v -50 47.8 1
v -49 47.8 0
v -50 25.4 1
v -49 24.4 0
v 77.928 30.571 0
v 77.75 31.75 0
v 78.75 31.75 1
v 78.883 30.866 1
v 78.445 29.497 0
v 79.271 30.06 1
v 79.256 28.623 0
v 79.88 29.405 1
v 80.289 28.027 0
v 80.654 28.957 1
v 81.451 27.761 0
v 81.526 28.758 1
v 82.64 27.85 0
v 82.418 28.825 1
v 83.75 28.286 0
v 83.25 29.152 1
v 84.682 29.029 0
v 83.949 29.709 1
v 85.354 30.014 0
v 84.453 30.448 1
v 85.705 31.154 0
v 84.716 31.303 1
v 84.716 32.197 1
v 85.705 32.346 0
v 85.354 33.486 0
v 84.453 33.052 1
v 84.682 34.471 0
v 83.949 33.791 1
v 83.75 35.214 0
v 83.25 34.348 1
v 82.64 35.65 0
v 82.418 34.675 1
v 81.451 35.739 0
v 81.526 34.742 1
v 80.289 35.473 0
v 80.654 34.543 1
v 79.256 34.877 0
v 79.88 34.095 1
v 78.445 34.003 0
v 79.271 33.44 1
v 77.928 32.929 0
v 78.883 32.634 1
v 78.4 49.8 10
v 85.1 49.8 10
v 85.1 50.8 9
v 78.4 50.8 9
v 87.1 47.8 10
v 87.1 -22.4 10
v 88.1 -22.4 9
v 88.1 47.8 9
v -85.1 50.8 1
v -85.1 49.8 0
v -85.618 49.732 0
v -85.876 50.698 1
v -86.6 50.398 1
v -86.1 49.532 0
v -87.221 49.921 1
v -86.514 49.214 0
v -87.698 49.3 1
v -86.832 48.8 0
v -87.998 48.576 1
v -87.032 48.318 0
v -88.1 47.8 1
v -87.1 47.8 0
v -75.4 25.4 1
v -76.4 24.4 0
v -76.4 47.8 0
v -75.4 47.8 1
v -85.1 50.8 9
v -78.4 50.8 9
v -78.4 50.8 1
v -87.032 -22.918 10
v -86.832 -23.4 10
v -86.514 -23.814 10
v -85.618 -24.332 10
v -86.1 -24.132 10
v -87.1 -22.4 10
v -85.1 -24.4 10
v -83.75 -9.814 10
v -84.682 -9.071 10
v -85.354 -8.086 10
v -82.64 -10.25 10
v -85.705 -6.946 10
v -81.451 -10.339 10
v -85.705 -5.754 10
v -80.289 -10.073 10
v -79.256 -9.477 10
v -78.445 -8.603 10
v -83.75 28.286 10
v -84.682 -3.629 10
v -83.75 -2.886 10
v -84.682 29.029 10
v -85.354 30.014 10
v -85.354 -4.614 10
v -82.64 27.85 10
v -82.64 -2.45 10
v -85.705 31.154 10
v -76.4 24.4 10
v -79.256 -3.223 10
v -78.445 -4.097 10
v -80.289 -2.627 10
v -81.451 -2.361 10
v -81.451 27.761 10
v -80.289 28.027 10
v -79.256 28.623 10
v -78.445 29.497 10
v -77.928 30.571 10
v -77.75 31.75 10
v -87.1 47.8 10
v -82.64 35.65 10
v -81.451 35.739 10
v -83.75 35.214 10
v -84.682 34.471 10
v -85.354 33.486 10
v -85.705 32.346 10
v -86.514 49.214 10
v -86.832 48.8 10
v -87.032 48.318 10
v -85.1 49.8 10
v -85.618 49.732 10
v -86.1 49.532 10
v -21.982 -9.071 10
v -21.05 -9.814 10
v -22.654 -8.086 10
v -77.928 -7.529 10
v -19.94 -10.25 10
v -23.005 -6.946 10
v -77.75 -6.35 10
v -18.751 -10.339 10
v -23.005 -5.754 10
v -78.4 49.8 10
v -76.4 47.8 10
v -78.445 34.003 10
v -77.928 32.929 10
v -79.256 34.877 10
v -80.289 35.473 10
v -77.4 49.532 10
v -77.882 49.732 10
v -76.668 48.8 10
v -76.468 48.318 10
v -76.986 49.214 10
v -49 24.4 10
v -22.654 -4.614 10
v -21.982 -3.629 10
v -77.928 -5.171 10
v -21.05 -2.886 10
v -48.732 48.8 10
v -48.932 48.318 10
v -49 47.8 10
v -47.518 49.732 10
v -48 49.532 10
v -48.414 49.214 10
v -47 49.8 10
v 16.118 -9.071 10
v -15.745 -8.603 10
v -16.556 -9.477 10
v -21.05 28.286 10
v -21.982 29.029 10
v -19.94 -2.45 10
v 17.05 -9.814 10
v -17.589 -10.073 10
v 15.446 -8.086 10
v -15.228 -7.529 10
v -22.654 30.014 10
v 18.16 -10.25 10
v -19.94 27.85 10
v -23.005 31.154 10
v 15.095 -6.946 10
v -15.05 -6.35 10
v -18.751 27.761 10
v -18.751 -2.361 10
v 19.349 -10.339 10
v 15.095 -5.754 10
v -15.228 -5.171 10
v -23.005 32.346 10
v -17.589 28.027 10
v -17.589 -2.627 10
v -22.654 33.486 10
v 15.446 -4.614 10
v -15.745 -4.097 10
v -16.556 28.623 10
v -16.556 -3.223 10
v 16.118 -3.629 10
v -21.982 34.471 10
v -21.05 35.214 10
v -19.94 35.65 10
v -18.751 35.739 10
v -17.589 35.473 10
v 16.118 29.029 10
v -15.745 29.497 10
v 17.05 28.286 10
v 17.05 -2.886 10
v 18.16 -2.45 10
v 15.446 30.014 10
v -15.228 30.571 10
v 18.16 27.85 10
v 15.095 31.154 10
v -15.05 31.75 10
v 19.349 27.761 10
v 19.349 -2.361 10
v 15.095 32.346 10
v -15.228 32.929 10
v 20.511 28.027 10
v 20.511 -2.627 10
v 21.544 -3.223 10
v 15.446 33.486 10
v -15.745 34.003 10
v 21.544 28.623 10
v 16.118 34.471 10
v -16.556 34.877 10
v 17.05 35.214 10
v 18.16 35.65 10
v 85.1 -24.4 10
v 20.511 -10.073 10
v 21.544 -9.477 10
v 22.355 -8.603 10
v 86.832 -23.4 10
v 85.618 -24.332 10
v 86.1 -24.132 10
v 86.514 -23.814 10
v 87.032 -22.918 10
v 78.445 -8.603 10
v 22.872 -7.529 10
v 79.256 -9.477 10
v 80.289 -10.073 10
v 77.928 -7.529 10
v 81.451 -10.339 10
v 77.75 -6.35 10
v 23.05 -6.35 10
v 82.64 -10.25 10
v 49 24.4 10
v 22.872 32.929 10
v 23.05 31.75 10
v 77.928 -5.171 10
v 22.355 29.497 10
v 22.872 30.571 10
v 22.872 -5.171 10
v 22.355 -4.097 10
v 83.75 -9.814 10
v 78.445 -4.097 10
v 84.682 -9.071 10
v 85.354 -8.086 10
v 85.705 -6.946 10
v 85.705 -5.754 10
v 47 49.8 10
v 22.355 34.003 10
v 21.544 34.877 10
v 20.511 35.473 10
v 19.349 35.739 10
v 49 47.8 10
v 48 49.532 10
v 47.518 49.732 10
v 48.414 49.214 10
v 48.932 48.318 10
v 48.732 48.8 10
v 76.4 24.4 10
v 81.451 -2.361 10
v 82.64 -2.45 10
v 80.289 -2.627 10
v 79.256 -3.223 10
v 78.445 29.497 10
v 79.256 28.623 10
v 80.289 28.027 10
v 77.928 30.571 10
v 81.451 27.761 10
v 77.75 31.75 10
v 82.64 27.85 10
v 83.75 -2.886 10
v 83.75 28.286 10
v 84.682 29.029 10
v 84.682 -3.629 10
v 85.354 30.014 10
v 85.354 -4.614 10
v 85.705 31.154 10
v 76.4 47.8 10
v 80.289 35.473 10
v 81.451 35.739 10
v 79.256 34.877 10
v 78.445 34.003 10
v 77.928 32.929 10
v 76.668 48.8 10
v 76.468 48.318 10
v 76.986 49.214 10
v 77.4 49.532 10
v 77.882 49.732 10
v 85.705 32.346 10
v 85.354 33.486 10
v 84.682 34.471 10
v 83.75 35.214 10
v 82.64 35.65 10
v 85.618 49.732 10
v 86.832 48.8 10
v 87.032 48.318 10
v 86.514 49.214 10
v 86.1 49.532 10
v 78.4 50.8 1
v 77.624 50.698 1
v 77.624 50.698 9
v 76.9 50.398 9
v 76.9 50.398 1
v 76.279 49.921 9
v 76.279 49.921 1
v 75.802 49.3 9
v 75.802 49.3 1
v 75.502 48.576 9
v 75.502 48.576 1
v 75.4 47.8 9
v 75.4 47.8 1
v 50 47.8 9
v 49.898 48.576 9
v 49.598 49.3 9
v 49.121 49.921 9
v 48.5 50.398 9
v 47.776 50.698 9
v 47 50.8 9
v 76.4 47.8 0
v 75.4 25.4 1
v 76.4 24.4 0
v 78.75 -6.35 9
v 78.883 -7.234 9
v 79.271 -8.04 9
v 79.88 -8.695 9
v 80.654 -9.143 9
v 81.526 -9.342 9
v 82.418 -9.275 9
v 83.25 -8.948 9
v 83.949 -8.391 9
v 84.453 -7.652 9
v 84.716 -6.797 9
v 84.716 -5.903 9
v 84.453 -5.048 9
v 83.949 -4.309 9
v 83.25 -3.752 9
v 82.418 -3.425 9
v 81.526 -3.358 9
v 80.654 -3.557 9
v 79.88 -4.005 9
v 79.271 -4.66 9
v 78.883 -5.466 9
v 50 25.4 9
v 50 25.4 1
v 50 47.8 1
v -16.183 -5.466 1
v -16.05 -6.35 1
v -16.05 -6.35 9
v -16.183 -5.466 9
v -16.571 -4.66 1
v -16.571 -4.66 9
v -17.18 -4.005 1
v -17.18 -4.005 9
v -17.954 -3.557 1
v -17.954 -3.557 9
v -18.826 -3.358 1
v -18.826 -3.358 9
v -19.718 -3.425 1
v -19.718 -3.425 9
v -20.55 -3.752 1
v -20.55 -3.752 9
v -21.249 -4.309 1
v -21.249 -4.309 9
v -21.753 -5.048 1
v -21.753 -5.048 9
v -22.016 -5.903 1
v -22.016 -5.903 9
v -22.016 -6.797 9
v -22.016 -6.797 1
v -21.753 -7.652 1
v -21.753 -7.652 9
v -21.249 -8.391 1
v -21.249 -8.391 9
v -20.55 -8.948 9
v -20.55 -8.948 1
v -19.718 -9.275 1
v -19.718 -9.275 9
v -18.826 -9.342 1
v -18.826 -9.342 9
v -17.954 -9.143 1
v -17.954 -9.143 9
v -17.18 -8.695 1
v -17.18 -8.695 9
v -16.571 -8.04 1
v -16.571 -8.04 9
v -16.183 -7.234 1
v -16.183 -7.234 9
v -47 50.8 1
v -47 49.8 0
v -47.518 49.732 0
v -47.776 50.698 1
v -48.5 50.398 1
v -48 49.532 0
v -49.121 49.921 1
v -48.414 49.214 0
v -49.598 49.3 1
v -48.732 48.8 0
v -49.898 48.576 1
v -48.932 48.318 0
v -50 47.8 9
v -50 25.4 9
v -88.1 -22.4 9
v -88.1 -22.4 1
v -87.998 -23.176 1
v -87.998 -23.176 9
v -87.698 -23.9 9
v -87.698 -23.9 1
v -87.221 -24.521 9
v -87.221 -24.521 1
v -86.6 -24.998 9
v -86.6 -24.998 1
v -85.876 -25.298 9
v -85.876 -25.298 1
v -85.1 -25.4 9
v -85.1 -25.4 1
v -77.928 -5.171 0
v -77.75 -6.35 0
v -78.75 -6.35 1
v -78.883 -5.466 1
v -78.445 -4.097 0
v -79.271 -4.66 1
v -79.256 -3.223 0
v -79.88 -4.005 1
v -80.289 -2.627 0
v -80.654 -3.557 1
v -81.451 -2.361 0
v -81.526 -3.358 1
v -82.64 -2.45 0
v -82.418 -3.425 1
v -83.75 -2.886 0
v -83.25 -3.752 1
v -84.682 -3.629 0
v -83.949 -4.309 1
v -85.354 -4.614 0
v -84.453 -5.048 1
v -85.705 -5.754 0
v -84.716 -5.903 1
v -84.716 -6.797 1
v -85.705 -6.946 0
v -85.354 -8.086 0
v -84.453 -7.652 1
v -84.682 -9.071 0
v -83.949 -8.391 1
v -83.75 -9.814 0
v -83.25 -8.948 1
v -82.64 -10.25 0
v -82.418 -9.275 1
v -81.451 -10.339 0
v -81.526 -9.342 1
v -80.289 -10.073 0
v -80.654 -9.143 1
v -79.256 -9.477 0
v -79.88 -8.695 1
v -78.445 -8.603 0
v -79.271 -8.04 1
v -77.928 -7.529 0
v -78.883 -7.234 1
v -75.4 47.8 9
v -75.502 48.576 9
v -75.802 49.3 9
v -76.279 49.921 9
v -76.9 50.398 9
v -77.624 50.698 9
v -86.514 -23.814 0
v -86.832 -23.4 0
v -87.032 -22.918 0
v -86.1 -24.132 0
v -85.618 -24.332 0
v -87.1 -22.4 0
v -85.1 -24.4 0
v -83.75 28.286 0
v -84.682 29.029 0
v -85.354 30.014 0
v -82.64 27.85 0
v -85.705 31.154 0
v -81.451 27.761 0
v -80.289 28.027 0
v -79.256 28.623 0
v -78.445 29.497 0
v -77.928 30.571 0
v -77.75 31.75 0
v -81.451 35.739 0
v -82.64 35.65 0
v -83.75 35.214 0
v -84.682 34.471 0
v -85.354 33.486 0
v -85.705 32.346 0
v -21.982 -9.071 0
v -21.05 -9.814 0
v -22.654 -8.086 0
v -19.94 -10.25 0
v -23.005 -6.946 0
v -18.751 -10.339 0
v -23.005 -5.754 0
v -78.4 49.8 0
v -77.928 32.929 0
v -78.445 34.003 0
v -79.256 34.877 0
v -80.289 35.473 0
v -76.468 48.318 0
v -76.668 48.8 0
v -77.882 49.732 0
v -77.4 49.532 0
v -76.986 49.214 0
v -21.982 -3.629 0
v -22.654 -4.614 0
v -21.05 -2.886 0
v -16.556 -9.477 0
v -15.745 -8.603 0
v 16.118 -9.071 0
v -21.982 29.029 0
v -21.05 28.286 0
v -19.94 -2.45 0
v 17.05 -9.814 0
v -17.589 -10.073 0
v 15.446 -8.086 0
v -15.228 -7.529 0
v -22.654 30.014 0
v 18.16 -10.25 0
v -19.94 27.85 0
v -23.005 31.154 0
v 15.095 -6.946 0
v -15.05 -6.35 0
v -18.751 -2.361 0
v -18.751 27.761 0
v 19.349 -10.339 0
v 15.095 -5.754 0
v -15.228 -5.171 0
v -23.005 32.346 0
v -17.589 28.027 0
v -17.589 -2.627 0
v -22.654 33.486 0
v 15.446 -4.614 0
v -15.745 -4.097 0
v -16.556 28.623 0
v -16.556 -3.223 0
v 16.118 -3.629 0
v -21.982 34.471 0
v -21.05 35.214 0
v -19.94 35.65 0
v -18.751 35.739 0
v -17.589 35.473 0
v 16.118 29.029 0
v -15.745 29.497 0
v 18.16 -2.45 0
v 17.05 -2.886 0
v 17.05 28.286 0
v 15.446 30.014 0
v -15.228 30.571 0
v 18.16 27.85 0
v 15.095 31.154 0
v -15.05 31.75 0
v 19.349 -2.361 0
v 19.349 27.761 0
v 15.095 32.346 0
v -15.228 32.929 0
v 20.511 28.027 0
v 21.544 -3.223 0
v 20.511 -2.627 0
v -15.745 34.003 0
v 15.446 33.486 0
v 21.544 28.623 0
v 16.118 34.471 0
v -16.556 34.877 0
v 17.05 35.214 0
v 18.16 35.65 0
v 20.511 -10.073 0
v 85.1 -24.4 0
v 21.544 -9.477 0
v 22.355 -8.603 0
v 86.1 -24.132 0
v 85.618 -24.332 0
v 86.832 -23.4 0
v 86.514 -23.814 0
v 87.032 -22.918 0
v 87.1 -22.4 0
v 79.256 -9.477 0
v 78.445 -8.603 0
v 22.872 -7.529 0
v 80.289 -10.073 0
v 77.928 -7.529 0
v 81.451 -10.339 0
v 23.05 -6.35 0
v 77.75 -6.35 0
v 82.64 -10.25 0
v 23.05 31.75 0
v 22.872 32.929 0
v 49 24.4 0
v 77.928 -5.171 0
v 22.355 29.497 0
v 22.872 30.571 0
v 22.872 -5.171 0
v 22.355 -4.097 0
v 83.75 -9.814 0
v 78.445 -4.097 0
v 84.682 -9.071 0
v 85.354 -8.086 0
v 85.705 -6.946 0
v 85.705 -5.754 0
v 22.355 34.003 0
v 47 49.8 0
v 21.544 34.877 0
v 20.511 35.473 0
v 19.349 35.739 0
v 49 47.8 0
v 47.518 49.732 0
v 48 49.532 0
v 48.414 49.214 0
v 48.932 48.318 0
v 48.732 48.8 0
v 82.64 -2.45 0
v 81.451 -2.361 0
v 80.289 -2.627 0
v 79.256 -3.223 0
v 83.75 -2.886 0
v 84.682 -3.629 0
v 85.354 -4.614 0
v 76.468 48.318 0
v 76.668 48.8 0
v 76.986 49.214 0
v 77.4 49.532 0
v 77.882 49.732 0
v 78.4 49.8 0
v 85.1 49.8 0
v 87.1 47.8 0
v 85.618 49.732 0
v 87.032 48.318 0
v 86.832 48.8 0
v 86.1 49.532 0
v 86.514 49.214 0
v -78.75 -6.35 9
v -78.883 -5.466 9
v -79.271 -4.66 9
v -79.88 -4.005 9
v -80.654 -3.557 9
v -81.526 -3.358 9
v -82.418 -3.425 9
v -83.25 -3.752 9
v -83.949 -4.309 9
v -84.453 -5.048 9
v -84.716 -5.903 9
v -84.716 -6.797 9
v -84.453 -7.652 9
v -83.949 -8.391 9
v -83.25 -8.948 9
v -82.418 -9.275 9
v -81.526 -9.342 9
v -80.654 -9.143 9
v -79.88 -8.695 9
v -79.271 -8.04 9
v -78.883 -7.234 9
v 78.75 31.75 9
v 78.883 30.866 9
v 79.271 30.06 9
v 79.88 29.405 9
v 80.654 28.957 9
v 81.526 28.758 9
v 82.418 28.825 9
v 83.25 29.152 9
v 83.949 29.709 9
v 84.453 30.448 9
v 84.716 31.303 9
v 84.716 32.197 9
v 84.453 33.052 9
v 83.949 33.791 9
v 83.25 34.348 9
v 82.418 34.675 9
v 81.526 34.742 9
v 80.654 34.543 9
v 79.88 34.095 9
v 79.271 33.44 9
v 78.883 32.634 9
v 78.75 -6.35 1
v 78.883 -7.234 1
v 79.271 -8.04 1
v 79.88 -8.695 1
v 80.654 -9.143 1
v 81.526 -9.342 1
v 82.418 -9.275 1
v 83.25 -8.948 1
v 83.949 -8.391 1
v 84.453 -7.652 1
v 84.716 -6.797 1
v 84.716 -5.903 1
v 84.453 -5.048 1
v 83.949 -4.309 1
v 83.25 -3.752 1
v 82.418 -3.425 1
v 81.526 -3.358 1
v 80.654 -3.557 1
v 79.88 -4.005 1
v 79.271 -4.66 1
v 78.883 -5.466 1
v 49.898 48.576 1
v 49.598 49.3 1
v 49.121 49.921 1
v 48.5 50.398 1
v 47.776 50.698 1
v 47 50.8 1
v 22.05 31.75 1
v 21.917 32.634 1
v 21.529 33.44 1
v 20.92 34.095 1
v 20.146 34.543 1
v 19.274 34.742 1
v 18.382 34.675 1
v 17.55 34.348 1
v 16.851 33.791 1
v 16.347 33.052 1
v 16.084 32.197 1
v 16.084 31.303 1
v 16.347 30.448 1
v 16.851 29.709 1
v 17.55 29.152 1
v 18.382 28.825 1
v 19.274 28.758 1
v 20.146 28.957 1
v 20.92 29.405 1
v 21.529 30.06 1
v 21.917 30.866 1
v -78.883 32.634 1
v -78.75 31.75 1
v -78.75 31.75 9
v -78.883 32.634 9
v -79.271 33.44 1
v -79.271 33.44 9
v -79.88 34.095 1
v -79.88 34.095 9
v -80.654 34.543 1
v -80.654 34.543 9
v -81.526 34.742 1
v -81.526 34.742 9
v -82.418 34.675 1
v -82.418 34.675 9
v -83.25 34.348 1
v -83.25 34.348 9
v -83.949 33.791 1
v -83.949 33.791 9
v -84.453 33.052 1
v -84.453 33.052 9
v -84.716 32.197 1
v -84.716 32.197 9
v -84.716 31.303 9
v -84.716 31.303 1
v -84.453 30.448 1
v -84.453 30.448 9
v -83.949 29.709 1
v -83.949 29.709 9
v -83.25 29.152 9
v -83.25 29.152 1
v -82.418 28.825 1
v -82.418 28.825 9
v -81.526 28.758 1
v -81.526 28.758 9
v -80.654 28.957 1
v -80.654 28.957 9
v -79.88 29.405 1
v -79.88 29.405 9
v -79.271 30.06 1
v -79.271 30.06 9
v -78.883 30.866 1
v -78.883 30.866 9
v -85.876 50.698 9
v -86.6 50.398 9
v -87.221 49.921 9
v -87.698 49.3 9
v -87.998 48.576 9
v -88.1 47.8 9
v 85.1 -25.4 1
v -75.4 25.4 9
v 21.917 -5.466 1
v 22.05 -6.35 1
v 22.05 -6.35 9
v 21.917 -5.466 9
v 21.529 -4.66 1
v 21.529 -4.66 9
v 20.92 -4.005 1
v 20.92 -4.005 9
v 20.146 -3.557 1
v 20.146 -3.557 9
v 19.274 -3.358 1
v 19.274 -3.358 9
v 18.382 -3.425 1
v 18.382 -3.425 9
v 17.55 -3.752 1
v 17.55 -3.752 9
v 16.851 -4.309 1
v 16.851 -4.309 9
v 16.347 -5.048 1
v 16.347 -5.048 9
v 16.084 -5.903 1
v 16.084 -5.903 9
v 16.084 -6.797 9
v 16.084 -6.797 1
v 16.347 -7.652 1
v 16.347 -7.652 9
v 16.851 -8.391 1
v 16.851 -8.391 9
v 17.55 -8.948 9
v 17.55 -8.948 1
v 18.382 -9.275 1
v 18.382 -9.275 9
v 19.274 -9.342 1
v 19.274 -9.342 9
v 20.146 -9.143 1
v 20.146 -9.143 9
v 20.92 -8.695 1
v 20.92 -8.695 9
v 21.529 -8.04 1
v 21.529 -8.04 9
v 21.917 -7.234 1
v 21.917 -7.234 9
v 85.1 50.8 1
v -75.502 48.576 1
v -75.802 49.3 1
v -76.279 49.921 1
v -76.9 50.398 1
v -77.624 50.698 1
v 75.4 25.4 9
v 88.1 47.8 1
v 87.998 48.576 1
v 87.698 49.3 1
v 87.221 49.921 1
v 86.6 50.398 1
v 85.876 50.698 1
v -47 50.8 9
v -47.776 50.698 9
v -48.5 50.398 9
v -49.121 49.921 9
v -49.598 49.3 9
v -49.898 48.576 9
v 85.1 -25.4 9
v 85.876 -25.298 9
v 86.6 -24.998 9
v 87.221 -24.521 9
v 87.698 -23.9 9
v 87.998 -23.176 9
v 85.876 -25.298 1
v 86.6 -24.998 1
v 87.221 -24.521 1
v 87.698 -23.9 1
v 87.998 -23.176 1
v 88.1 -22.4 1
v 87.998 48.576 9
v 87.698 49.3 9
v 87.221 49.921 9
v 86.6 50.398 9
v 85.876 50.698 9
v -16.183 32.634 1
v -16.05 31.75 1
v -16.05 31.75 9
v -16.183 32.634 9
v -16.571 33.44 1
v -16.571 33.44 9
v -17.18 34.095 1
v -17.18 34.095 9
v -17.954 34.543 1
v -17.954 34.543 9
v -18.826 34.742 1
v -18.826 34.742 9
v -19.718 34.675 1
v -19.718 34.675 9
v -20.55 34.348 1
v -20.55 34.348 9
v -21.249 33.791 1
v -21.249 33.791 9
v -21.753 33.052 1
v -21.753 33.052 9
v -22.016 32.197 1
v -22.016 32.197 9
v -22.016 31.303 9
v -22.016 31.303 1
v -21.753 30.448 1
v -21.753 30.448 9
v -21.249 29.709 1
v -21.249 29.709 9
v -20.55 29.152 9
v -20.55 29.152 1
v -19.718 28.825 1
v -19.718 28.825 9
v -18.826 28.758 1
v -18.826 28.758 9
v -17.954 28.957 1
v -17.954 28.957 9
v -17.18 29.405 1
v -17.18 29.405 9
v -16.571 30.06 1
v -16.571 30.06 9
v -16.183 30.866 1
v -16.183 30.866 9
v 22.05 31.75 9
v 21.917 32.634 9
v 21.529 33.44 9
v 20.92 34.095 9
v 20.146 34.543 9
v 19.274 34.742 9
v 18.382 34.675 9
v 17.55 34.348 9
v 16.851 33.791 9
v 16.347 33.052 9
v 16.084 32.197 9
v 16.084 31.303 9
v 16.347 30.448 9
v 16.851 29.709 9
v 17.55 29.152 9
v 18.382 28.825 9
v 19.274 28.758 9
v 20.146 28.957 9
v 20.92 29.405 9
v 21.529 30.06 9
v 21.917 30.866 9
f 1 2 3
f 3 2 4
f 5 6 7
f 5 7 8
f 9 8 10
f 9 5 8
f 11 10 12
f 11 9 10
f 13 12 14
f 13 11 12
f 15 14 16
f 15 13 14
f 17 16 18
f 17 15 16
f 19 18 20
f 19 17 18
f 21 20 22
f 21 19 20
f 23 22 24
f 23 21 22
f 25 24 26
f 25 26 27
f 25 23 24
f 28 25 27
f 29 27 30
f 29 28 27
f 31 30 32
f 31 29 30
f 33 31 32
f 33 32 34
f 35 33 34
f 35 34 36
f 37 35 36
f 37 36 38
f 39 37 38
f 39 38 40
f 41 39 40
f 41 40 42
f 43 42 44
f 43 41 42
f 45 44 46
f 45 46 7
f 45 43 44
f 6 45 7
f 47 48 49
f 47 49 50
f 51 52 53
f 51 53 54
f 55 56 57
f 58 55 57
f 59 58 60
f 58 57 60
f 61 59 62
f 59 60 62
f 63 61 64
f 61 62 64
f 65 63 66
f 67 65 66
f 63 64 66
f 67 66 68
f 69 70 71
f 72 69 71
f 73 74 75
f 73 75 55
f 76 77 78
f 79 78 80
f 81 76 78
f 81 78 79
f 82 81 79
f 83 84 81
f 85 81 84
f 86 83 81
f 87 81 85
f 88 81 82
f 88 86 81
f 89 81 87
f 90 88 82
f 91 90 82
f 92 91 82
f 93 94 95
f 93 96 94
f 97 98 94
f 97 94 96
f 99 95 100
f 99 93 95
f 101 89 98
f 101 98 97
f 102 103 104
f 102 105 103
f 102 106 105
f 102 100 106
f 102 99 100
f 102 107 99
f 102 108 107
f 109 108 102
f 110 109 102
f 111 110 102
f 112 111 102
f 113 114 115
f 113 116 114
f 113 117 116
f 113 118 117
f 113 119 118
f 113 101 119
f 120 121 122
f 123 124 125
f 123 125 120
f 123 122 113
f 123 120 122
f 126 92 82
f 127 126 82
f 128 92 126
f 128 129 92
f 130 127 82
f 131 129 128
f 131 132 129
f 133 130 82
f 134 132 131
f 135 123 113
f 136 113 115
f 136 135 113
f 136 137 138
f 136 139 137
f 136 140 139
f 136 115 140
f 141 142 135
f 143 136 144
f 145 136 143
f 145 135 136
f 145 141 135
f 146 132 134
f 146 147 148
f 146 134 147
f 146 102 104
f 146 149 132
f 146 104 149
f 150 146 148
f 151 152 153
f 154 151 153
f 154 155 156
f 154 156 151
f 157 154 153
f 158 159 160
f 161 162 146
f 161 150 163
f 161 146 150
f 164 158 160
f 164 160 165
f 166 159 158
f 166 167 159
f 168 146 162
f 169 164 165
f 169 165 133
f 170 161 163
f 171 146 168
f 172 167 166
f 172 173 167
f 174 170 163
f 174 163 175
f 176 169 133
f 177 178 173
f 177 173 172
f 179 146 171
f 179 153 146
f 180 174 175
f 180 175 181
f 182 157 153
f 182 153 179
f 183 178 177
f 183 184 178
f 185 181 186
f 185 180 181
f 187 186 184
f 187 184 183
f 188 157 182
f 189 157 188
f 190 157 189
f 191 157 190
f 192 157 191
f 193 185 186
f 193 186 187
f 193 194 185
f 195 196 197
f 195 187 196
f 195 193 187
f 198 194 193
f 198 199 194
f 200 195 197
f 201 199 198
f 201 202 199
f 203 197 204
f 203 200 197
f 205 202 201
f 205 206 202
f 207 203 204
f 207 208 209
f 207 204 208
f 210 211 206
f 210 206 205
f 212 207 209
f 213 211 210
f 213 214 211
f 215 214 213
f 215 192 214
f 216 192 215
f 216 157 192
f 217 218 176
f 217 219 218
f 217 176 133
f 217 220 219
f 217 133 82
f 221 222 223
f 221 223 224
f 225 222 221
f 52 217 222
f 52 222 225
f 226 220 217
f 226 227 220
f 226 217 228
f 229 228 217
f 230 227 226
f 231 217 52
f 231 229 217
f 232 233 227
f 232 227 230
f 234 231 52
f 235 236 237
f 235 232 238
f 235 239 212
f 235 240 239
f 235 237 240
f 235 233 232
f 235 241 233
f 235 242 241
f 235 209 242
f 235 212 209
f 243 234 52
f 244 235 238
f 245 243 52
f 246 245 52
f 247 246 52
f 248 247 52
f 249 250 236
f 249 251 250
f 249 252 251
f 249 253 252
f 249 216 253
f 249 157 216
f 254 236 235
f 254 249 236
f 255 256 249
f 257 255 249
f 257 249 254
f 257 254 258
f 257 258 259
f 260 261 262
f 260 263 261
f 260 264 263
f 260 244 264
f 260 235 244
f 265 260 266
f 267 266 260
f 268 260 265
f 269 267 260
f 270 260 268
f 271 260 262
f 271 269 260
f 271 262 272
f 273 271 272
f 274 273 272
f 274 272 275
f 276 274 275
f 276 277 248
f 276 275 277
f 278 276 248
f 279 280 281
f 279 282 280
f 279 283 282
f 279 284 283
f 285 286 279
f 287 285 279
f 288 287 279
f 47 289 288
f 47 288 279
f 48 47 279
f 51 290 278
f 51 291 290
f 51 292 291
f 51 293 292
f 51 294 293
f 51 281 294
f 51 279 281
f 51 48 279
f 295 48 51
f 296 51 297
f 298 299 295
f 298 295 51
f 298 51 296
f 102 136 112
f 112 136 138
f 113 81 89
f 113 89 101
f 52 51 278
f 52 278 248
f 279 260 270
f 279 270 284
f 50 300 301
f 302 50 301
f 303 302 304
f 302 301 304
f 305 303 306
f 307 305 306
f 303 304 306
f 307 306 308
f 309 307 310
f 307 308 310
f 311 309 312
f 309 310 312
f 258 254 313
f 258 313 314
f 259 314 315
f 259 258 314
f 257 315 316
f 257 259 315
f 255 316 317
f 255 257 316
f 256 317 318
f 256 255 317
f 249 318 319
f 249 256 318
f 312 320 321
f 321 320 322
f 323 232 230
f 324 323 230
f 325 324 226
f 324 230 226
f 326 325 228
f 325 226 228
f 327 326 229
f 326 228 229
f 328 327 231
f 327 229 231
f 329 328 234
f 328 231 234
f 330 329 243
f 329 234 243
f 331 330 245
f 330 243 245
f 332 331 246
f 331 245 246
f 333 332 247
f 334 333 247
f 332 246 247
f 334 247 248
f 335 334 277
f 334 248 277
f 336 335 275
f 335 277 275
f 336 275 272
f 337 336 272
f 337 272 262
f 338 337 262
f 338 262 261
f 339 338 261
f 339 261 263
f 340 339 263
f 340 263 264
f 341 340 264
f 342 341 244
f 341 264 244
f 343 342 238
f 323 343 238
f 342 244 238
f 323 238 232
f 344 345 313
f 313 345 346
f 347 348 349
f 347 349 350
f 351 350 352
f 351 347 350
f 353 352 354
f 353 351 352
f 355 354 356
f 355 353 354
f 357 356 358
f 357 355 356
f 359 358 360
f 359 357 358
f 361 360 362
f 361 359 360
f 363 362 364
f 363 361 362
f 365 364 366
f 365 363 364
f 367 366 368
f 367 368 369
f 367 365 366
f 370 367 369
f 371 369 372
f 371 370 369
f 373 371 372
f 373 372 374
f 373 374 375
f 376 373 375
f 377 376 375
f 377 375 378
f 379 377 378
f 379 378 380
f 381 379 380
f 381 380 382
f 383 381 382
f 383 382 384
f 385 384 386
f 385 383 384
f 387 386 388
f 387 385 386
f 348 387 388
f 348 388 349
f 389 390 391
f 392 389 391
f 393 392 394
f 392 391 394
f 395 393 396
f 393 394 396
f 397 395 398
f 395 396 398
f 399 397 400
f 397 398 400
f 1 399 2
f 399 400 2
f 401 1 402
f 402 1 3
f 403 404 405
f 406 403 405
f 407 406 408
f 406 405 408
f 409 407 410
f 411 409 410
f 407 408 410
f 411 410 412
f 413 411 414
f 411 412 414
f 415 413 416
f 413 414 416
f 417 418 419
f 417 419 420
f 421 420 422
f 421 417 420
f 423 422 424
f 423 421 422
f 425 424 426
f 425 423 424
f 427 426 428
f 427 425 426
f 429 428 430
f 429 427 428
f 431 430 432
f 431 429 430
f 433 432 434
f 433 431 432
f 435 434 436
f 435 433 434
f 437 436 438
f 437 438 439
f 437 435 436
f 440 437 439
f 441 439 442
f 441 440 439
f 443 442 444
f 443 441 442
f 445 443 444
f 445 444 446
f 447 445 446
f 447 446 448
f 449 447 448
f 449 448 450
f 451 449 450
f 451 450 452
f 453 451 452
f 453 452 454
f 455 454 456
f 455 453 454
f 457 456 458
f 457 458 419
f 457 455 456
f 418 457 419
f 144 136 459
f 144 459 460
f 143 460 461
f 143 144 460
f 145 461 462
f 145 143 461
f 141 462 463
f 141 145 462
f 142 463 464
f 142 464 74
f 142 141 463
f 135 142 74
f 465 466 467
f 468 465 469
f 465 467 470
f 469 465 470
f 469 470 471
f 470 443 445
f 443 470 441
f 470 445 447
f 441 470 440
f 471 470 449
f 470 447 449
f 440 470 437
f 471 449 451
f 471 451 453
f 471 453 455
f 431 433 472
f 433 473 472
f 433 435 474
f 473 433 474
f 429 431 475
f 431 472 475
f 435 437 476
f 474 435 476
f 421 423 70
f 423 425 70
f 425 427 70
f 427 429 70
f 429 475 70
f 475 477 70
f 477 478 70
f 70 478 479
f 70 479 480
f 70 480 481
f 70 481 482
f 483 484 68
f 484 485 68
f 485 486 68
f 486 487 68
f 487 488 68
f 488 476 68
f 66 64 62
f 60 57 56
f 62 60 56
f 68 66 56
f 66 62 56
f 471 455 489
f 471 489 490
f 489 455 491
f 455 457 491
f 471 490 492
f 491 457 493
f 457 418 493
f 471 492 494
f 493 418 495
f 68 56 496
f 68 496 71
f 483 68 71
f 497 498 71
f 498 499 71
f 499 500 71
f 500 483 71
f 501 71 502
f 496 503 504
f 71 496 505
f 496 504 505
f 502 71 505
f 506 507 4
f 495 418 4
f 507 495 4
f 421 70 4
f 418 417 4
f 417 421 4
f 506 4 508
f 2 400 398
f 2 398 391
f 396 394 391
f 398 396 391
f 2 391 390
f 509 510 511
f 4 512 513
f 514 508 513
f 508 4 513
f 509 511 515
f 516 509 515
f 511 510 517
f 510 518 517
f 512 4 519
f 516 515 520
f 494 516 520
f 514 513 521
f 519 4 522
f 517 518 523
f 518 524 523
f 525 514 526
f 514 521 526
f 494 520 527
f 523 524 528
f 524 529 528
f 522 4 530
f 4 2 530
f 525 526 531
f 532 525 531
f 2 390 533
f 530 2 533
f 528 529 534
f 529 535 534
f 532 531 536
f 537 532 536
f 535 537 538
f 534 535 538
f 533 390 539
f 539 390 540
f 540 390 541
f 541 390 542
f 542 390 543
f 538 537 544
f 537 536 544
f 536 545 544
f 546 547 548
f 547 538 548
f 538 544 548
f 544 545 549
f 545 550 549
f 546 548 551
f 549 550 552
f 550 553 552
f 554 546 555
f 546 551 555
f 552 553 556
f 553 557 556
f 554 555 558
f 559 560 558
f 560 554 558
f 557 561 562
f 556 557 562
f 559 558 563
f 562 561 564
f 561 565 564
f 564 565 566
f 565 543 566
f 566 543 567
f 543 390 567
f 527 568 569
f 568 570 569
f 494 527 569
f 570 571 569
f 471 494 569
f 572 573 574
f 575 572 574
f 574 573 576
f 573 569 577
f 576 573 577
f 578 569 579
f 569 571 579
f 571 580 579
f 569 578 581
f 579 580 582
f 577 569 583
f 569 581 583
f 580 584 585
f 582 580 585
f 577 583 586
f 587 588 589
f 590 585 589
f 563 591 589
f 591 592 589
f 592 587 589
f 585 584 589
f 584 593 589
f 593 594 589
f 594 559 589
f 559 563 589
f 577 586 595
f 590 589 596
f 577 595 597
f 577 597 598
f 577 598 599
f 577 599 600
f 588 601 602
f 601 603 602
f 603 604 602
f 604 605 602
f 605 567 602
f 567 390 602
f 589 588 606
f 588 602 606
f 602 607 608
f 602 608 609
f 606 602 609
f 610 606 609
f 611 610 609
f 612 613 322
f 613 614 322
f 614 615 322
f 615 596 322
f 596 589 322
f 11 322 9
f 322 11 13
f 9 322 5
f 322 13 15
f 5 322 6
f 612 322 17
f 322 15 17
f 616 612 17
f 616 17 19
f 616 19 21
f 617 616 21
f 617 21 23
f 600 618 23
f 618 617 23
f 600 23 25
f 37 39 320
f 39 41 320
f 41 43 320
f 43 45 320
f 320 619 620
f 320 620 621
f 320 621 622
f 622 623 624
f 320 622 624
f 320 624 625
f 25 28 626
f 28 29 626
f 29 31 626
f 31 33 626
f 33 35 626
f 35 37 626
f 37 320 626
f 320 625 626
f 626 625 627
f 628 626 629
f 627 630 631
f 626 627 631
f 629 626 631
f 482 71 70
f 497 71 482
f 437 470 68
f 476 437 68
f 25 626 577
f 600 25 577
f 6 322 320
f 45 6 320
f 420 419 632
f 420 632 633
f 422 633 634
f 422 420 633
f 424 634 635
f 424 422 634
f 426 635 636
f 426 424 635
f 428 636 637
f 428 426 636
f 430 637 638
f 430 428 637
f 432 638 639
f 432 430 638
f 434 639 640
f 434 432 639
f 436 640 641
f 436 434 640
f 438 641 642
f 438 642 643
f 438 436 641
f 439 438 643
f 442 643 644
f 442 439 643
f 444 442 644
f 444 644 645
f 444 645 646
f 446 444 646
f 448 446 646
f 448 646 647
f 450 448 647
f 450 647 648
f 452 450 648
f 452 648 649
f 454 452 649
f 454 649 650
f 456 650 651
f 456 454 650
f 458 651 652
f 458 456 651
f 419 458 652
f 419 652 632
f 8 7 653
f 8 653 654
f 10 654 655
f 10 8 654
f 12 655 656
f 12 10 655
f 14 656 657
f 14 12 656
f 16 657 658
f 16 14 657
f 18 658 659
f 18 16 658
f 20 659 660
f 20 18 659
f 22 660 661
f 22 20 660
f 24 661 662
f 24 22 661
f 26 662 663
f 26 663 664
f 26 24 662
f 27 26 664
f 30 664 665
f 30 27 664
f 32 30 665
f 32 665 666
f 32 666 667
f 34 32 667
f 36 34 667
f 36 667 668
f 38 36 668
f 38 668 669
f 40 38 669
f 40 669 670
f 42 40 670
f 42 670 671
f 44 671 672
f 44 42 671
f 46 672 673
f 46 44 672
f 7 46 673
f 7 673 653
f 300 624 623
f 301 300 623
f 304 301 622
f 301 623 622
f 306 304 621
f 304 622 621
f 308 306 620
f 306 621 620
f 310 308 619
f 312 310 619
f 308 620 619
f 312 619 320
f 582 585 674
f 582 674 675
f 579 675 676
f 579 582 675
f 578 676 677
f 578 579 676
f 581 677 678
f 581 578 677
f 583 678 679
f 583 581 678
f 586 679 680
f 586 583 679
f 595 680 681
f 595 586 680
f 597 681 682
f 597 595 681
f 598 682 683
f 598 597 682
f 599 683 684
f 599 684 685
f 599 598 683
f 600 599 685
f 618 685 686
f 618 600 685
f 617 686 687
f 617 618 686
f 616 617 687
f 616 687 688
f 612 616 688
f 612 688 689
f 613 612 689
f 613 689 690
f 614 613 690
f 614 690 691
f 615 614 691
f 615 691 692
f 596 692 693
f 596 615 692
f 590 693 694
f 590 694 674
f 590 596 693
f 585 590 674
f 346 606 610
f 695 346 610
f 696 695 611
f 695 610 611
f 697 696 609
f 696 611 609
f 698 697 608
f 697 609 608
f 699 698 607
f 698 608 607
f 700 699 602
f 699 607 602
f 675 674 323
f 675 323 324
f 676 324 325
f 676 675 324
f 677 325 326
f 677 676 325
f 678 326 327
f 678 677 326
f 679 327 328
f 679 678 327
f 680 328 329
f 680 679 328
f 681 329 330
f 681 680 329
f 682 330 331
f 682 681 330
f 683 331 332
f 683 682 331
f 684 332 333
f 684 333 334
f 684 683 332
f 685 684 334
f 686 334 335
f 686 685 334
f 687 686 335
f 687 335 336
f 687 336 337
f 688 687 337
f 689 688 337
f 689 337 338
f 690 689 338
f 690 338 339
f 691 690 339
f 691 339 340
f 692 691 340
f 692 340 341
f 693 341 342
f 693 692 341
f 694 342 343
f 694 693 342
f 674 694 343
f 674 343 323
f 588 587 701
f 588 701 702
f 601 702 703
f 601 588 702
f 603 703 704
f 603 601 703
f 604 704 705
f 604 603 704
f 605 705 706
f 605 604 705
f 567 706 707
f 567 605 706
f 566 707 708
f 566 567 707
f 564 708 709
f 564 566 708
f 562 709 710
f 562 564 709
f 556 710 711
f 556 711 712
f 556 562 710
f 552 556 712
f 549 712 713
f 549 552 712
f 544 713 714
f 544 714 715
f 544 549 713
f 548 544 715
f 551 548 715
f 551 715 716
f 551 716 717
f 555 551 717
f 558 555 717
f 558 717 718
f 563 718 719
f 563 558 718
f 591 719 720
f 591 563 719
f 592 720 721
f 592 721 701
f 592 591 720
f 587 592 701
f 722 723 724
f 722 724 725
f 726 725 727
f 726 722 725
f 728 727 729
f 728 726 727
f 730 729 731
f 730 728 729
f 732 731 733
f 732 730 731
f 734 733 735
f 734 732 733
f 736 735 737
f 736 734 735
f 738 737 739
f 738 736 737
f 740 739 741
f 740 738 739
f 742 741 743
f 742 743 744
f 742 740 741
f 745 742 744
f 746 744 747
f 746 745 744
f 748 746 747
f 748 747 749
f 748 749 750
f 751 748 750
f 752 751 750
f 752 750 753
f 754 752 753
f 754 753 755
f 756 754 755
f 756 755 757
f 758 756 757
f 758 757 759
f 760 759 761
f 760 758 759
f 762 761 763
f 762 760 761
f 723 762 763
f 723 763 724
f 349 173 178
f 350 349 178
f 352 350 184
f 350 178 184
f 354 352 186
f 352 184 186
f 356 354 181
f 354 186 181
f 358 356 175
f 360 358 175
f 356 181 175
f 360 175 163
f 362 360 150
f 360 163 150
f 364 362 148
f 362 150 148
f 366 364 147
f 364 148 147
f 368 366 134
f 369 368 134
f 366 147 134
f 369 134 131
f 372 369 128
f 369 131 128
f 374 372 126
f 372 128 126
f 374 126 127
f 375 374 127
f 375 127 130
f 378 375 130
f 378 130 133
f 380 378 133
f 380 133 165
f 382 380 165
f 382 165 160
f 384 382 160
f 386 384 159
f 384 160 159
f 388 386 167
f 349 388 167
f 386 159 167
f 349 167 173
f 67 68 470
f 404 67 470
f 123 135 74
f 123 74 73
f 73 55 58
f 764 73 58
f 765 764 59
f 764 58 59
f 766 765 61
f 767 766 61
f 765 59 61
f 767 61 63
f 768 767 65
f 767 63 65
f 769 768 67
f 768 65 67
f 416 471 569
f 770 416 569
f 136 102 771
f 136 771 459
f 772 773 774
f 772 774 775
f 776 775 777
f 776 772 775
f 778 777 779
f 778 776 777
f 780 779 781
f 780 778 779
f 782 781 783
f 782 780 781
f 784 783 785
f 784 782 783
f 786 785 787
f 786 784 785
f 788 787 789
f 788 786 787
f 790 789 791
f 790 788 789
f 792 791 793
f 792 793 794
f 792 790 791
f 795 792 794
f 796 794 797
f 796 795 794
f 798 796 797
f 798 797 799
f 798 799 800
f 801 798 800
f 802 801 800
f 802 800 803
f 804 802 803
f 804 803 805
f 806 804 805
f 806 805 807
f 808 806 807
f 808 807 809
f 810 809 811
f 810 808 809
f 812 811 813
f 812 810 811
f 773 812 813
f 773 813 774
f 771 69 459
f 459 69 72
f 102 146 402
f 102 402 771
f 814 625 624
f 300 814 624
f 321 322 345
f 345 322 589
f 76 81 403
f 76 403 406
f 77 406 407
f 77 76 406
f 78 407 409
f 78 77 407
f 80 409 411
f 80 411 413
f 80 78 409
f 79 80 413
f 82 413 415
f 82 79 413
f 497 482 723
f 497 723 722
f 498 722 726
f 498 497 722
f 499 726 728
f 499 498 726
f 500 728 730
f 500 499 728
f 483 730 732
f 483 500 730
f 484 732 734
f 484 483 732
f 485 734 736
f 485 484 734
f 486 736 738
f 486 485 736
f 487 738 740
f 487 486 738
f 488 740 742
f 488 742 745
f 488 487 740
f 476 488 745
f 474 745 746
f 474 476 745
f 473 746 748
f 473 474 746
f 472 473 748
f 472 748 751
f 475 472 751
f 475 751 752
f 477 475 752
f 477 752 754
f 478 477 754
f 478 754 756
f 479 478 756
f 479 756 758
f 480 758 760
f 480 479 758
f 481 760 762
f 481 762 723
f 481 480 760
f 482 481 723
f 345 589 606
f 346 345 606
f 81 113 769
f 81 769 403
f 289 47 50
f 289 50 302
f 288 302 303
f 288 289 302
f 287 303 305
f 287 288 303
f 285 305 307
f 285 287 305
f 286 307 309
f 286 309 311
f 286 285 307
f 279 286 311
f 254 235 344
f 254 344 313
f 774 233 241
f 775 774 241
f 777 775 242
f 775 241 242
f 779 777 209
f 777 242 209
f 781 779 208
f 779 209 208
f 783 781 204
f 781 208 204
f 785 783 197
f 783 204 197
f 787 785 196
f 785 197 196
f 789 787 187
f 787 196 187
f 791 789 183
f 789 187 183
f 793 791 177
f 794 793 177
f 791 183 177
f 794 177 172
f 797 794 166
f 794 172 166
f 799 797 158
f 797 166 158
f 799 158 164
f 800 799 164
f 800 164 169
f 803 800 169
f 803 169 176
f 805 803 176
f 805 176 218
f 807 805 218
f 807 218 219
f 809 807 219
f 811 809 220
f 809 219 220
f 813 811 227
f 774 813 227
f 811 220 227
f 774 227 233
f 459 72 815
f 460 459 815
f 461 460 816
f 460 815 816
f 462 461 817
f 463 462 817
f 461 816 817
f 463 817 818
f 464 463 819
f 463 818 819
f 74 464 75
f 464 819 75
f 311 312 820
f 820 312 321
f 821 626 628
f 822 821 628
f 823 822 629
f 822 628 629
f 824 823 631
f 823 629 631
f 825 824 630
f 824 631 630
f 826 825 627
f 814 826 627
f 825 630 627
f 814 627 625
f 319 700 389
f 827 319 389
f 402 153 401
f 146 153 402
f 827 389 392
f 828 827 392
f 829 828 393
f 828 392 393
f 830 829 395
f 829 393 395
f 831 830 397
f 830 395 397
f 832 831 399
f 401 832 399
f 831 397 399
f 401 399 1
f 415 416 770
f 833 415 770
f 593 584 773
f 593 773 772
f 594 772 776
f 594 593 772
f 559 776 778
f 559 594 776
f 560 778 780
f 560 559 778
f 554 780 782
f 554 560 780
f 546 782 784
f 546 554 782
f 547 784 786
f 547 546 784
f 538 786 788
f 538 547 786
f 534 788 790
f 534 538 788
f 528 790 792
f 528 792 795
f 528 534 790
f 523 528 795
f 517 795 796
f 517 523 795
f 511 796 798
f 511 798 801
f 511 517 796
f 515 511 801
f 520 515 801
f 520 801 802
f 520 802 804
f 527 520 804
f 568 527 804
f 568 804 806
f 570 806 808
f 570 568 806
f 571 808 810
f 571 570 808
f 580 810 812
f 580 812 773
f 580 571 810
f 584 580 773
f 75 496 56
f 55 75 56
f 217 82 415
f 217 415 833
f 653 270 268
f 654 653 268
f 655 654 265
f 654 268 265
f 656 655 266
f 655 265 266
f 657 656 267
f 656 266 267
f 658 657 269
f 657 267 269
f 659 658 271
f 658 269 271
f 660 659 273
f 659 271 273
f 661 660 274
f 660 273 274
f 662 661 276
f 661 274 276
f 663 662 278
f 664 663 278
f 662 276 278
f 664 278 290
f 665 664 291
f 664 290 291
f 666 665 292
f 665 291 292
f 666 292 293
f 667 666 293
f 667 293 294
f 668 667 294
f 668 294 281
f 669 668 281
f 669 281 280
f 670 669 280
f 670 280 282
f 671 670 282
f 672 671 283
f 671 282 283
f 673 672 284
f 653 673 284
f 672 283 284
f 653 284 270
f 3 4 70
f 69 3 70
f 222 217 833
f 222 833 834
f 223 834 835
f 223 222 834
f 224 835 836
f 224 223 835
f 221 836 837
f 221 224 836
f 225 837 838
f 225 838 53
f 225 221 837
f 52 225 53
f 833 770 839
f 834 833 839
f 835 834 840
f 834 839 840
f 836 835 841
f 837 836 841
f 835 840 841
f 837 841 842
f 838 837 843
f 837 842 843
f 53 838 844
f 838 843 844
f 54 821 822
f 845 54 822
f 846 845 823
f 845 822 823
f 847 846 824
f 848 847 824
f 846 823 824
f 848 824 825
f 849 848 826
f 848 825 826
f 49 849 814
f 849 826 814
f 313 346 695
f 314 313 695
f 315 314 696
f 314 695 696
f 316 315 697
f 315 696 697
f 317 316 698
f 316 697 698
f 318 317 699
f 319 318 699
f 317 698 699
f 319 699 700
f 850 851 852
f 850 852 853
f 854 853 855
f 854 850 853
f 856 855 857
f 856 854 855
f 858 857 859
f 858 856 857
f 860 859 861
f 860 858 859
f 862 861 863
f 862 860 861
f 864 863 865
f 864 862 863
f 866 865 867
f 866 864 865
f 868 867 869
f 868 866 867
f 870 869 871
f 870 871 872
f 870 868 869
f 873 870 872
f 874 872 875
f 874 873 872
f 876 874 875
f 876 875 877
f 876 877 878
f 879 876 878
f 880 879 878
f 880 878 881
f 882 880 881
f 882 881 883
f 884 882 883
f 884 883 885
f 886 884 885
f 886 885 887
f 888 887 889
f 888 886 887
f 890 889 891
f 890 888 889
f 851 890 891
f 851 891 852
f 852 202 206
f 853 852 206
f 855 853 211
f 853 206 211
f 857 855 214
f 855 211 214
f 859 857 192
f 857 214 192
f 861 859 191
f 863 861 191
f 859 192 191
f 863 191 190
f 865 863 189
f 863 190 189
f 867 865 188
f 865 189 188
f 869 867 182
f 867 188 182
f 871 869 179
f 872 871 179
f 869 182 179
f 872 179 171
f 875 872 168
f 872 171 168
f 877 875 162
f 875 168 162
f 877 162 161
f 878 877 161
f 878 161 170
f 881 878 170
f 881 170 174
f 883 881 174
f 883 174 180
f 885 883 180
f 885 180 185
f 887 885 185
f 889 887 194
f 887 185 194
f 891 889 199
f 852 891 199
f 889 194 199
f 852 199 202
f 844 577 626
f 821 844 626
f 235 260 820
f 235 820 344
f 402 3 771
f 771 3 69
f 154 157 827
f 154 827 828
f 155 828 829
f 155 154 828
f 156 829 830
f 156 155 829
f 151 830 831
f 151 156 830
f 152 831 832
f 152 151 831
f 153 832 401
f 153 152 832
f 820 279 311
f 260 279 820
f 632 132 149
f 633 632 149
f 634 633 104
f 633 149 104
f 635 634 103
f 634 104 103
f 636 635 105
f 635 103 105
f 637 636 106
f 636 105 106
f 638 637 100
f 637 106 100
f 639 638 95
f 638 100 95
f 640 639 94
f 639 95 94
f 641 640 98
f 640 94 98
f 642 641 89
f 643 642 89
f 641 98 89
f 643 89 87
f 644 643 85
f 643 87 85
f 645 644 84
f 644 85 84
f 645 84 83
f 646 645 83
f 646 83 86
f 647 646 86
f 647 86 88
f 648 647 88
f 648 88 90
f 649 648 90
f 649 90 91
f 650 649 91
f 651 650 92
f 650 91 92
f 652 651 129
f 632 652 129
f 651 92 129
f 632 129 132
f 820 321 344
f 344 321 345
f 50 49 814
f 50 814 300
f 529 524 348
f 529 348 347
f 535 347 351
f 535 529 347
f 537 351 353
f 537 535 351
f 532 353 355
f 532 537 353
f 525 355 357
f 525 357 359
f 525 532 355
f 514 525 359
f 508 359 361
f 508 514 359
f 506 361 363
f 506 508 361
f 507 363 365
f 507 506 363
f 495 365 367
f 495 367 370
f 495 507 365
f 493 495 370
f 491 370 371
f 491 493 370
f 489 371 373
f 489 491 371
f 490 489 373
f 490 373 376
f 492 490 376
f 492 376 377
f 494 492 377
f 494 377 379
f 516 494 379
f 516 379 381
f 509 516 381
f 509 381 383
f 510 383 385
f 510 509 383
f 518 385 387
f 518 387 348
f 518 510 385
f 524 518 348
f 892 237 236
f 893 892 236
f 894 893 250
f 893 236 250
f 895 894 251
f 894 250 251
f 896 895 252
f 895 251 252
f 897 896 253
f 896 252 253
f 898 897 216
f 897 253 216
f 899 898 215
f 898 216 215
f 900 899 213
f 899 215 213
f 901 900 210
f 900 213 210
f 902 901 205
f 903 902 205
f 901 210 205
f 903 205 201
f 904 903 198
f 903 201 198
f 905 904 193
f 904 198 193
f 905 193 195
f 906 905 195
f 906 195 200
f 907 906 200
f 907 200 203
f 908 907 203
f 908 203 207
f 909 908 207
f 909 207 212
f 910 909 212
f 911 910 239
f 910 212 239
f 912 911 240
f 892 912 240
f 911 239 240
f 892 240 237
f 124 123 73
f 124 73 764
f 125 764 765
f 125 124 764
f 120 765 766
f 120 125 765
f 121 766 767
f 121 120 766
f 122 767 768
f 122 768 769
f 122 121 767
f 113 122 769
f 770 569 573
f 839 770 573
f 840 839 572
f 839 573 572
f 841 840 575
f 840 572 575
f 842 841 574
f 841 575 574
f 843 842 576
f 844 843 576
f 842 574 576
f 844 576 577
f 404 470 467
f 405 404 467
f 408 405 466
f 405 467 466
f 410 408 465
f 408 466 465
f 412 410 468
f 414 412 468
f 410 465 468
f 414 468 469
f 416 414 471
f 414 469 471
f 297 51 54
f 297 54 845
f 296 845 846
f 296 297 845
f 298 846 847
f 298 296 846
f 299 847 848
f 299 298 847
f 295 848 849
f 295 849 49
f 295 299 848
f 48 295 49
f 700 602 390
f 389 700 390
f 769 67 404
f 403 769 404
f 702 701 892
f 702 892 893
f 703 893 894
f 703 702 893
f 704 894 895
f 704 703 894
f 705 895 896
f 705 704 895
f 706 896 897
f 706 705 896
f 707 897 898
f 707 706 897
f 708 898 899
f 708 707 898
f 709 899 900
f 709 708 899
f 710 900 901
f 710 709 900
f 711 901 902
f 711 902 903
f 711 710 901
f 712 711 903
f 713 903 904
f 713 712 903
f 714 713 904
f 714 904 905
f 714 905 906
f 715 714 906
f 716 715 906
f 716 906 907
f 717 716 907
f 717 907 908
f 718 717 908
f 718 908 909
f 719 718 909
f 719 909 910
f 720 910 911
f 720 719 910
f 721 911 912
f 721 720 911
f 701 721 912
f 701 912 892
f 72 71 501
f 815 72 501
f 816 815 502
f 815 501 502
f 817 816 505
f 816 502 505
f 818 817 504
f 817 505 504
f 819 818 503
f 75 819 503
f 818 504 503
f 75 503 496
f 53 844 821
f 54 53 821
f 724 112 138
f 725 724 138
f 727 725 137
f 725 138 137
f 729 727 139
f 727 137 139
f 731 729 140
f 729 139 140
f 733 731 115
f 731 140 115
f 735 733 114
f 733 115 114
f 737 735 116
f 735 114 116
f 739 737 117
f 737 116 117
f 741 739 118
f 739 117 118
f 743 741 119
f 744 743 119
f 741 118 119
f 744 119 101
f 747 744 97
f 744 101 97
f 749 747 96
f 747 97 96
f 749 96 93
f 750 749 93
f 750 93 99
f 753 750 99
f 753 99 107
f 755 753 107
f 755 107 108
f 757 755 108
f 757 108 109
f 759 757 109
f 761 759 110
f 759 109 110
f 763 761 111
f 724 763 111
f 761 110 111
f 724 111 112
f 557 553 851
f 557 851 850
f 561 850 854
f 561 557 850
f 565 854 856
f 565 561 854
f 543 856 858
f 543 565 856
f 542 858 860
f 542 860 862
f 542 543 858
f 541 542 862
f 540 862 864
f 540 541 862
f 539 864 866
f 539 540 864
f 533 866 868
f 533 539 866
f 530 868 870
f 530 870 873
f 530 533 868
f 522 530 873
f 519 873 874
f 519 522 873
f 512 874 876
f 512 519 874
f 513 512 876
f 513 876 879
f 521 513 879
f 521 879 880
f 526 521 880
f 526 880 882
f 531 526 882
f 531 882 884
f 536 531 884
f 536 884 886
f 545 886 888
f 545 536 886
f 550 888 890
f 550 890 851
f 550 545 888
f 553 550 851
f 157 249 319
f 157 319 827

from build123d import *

# Parameters (mm, degrees)
SKETCH1_R           = 3
BOSS_EXTRUDE1_DEPTH = 10
CHAMFER1_SIZE       = 1


with BuildPart() as part:
    # Sketch1 → Boss-Extrude1 (new body)
    with BuildSketch(Plane.XY):
        with BuildLine():
            Line((75.4, 25.4), (50, 25.4))
            Line((50, 25.4), (50, 47.8))
            ThreePointArc((50, 47.8), (49.121320344, 49.921320344), (47, 50.8))
            Line((47, 50.8), (-47, 50.8))
            ThreePointArc((-47, 50.8), (-49.121320344, 49.921320344), (-50, 47.8))
            Line((-50, 47.8), (-50, 25.4))
            Line((-50, 25.4), (-75.4, 25.4))
            Line((-75.4, 25.4), (-75.4, 47.8))
            ThreePointArc((-75.4, 47.8), (-76.278679656, 49.921320344), (-78.4, 50.8))
            Line((-78.4, 50.8), (-85.1, 50.8))
            ThreePointArc((-85.1, 50.8), (-87.221320344, 49.921320344), (-88.1, 47.8))
            Line((-88.1, 47.8), (-88.1, -22.4))
            ThreePointArc((-88.1, -22.4), (-87.221320344, -24.521320344), (-85.1, -25.4))
            Line((-85.1, -25.4), (85.1, -25.4))
            ThreePointArc((85.1, -25.4), (87.221320344, -24.521320344), (88.1, -22.4))
            Line((88.1, -22.4), (88.1, 47.8))
            ThreePointArc((88.1, 47.8), (87.221320344, 49.921320344), (85.1, 50.8))
            Line((85.1, 50.8), (78.4, 50.8))
            ThreePointArc((78.4, 50.8), (76.278679656, 49.921320344), (75.4, 47.8))
            Line((75.4, 47.8), (75.4, 25.4))
        make_face()
        with Locations((-19.05, 31.75)):
            Circle(SKETCH1_R, mode=Mode.SUBTRACT)
        with Locations((19.05, 31.75)):
            Circle(SKETCH1_R, mode=Mode.SUBTRACT)
        with Locations((19.05, -6.35)):
            Circle(SKETCH1_R, mode=Mode.SUBTRACT)
        with Locations((-19.05, -6.35)):
            Circle(SKETCH1_R, mode=Mode.SUBTRACT)
        with Locations((-81.75, 31.75)):
            Circle(SKETCH1_R, mode=Mode.SUBTRACT)
        with Locations((-81.75, -6.35)):
            Circle(SKETCH1_R, mode=Mode.SUBTRACT)
        with Locations(Location((81.75, -6.35, 0), (0, 0, 180))):
            Circle(SKETCH1_R, mode=Mode.SUBTRACT)
        with Locations(Location((81.75, 31.75, 0), (0, 0, 180))):
            Circle(SKETCH1_R, mode=Mode.SUBTRACT)
    extrude(amount=BOSS_EXTRUDE1_DEPTH)

    # Chamfer1
    chamfer1_edges = [part.edges().sort_by_distance(p)[0] for p in [
        (-81.75, 50.8, 10),
        (-87.221320344, 49.921320344, 10),
        (-62.7, 25.4, 0),
        (-50, 36.6, 0),
        (-49.121320344, 49.921320344, 0),
        (0, 50.8, 0),
        (-88.1, 12.7, 10),
        (49.121320344, 49.921320344, 0),
        (50, 36.6, 0),
        (62.7, 25.4, 0),
        (75.4, 36.6, 0),
        (76.278679656, 49.921320344, 0),
        (81.75, 50.8, 0),
        (87.221320344, 49.921320344, 0),
        (88.1, 12.7, 0),
        (87.221320344, -24.521320344, 0),
        (0, -25.4, 0),
        (-87.221320344, -24.521320344, 10),
        (-87.221320344, -24.521320344, 0),
        (-88.1, 12.7, 0),
        (-87.221320344, 49.921320344, 0),
        (-81.75, 50.8, 0),
        (-76.278679656, 49.921320344, 0),
        (-75.4, 36.6, 0),
        (0, -25.4, 10),
        (87.221320344, -24.521320344, 10),
        (88.1, 12.7, 10),
        (87.221320344, 49.921320344, 10),
        (81.75, 50.8, 10),
        (76.278679656, 49.921320344, 10),
        (-22.05, 31.75, 0),
        (-22.05, 31.75, 10),
        (-75.4, 36.6, 10),
        (75.4, 36.6, 10),
        (-84.75, 31.75, 0),
        (-84.75, 31.75, 10),
        (16.05, 31.75, 0),
        (62.7, 25.4, 10),
        (16.05, 31.75, 10),
        (16.05, -6.35, 0),
        (50, 36.6, 10),
        (16.05, -6.35, 10),
        (-22.05, -6.35, 0),
        (-22.05, -6.35, 10),
        (49.121320344, 49.921320344, 10),
        (-84.75, -6.35, 0),
        (-84.75, -6.35, 10),
        (0, 50.8, 10),
        (84.75, -6.35, 0),
        (84.75, -6.35, 10),
        (-49.121320344, 49.921320344, 10),
        (84.75, 31.75, 0),
        (84.75, 31.75, 10),
        (-50, 36.6, 10),
        (-62.7, 25.4, 10),
        (-76.278679656, 49.921320344, 10),
    ]]
    chamfer(chamfer1_edges, length=CHAMFER1_SIZE)


solid = part.part
